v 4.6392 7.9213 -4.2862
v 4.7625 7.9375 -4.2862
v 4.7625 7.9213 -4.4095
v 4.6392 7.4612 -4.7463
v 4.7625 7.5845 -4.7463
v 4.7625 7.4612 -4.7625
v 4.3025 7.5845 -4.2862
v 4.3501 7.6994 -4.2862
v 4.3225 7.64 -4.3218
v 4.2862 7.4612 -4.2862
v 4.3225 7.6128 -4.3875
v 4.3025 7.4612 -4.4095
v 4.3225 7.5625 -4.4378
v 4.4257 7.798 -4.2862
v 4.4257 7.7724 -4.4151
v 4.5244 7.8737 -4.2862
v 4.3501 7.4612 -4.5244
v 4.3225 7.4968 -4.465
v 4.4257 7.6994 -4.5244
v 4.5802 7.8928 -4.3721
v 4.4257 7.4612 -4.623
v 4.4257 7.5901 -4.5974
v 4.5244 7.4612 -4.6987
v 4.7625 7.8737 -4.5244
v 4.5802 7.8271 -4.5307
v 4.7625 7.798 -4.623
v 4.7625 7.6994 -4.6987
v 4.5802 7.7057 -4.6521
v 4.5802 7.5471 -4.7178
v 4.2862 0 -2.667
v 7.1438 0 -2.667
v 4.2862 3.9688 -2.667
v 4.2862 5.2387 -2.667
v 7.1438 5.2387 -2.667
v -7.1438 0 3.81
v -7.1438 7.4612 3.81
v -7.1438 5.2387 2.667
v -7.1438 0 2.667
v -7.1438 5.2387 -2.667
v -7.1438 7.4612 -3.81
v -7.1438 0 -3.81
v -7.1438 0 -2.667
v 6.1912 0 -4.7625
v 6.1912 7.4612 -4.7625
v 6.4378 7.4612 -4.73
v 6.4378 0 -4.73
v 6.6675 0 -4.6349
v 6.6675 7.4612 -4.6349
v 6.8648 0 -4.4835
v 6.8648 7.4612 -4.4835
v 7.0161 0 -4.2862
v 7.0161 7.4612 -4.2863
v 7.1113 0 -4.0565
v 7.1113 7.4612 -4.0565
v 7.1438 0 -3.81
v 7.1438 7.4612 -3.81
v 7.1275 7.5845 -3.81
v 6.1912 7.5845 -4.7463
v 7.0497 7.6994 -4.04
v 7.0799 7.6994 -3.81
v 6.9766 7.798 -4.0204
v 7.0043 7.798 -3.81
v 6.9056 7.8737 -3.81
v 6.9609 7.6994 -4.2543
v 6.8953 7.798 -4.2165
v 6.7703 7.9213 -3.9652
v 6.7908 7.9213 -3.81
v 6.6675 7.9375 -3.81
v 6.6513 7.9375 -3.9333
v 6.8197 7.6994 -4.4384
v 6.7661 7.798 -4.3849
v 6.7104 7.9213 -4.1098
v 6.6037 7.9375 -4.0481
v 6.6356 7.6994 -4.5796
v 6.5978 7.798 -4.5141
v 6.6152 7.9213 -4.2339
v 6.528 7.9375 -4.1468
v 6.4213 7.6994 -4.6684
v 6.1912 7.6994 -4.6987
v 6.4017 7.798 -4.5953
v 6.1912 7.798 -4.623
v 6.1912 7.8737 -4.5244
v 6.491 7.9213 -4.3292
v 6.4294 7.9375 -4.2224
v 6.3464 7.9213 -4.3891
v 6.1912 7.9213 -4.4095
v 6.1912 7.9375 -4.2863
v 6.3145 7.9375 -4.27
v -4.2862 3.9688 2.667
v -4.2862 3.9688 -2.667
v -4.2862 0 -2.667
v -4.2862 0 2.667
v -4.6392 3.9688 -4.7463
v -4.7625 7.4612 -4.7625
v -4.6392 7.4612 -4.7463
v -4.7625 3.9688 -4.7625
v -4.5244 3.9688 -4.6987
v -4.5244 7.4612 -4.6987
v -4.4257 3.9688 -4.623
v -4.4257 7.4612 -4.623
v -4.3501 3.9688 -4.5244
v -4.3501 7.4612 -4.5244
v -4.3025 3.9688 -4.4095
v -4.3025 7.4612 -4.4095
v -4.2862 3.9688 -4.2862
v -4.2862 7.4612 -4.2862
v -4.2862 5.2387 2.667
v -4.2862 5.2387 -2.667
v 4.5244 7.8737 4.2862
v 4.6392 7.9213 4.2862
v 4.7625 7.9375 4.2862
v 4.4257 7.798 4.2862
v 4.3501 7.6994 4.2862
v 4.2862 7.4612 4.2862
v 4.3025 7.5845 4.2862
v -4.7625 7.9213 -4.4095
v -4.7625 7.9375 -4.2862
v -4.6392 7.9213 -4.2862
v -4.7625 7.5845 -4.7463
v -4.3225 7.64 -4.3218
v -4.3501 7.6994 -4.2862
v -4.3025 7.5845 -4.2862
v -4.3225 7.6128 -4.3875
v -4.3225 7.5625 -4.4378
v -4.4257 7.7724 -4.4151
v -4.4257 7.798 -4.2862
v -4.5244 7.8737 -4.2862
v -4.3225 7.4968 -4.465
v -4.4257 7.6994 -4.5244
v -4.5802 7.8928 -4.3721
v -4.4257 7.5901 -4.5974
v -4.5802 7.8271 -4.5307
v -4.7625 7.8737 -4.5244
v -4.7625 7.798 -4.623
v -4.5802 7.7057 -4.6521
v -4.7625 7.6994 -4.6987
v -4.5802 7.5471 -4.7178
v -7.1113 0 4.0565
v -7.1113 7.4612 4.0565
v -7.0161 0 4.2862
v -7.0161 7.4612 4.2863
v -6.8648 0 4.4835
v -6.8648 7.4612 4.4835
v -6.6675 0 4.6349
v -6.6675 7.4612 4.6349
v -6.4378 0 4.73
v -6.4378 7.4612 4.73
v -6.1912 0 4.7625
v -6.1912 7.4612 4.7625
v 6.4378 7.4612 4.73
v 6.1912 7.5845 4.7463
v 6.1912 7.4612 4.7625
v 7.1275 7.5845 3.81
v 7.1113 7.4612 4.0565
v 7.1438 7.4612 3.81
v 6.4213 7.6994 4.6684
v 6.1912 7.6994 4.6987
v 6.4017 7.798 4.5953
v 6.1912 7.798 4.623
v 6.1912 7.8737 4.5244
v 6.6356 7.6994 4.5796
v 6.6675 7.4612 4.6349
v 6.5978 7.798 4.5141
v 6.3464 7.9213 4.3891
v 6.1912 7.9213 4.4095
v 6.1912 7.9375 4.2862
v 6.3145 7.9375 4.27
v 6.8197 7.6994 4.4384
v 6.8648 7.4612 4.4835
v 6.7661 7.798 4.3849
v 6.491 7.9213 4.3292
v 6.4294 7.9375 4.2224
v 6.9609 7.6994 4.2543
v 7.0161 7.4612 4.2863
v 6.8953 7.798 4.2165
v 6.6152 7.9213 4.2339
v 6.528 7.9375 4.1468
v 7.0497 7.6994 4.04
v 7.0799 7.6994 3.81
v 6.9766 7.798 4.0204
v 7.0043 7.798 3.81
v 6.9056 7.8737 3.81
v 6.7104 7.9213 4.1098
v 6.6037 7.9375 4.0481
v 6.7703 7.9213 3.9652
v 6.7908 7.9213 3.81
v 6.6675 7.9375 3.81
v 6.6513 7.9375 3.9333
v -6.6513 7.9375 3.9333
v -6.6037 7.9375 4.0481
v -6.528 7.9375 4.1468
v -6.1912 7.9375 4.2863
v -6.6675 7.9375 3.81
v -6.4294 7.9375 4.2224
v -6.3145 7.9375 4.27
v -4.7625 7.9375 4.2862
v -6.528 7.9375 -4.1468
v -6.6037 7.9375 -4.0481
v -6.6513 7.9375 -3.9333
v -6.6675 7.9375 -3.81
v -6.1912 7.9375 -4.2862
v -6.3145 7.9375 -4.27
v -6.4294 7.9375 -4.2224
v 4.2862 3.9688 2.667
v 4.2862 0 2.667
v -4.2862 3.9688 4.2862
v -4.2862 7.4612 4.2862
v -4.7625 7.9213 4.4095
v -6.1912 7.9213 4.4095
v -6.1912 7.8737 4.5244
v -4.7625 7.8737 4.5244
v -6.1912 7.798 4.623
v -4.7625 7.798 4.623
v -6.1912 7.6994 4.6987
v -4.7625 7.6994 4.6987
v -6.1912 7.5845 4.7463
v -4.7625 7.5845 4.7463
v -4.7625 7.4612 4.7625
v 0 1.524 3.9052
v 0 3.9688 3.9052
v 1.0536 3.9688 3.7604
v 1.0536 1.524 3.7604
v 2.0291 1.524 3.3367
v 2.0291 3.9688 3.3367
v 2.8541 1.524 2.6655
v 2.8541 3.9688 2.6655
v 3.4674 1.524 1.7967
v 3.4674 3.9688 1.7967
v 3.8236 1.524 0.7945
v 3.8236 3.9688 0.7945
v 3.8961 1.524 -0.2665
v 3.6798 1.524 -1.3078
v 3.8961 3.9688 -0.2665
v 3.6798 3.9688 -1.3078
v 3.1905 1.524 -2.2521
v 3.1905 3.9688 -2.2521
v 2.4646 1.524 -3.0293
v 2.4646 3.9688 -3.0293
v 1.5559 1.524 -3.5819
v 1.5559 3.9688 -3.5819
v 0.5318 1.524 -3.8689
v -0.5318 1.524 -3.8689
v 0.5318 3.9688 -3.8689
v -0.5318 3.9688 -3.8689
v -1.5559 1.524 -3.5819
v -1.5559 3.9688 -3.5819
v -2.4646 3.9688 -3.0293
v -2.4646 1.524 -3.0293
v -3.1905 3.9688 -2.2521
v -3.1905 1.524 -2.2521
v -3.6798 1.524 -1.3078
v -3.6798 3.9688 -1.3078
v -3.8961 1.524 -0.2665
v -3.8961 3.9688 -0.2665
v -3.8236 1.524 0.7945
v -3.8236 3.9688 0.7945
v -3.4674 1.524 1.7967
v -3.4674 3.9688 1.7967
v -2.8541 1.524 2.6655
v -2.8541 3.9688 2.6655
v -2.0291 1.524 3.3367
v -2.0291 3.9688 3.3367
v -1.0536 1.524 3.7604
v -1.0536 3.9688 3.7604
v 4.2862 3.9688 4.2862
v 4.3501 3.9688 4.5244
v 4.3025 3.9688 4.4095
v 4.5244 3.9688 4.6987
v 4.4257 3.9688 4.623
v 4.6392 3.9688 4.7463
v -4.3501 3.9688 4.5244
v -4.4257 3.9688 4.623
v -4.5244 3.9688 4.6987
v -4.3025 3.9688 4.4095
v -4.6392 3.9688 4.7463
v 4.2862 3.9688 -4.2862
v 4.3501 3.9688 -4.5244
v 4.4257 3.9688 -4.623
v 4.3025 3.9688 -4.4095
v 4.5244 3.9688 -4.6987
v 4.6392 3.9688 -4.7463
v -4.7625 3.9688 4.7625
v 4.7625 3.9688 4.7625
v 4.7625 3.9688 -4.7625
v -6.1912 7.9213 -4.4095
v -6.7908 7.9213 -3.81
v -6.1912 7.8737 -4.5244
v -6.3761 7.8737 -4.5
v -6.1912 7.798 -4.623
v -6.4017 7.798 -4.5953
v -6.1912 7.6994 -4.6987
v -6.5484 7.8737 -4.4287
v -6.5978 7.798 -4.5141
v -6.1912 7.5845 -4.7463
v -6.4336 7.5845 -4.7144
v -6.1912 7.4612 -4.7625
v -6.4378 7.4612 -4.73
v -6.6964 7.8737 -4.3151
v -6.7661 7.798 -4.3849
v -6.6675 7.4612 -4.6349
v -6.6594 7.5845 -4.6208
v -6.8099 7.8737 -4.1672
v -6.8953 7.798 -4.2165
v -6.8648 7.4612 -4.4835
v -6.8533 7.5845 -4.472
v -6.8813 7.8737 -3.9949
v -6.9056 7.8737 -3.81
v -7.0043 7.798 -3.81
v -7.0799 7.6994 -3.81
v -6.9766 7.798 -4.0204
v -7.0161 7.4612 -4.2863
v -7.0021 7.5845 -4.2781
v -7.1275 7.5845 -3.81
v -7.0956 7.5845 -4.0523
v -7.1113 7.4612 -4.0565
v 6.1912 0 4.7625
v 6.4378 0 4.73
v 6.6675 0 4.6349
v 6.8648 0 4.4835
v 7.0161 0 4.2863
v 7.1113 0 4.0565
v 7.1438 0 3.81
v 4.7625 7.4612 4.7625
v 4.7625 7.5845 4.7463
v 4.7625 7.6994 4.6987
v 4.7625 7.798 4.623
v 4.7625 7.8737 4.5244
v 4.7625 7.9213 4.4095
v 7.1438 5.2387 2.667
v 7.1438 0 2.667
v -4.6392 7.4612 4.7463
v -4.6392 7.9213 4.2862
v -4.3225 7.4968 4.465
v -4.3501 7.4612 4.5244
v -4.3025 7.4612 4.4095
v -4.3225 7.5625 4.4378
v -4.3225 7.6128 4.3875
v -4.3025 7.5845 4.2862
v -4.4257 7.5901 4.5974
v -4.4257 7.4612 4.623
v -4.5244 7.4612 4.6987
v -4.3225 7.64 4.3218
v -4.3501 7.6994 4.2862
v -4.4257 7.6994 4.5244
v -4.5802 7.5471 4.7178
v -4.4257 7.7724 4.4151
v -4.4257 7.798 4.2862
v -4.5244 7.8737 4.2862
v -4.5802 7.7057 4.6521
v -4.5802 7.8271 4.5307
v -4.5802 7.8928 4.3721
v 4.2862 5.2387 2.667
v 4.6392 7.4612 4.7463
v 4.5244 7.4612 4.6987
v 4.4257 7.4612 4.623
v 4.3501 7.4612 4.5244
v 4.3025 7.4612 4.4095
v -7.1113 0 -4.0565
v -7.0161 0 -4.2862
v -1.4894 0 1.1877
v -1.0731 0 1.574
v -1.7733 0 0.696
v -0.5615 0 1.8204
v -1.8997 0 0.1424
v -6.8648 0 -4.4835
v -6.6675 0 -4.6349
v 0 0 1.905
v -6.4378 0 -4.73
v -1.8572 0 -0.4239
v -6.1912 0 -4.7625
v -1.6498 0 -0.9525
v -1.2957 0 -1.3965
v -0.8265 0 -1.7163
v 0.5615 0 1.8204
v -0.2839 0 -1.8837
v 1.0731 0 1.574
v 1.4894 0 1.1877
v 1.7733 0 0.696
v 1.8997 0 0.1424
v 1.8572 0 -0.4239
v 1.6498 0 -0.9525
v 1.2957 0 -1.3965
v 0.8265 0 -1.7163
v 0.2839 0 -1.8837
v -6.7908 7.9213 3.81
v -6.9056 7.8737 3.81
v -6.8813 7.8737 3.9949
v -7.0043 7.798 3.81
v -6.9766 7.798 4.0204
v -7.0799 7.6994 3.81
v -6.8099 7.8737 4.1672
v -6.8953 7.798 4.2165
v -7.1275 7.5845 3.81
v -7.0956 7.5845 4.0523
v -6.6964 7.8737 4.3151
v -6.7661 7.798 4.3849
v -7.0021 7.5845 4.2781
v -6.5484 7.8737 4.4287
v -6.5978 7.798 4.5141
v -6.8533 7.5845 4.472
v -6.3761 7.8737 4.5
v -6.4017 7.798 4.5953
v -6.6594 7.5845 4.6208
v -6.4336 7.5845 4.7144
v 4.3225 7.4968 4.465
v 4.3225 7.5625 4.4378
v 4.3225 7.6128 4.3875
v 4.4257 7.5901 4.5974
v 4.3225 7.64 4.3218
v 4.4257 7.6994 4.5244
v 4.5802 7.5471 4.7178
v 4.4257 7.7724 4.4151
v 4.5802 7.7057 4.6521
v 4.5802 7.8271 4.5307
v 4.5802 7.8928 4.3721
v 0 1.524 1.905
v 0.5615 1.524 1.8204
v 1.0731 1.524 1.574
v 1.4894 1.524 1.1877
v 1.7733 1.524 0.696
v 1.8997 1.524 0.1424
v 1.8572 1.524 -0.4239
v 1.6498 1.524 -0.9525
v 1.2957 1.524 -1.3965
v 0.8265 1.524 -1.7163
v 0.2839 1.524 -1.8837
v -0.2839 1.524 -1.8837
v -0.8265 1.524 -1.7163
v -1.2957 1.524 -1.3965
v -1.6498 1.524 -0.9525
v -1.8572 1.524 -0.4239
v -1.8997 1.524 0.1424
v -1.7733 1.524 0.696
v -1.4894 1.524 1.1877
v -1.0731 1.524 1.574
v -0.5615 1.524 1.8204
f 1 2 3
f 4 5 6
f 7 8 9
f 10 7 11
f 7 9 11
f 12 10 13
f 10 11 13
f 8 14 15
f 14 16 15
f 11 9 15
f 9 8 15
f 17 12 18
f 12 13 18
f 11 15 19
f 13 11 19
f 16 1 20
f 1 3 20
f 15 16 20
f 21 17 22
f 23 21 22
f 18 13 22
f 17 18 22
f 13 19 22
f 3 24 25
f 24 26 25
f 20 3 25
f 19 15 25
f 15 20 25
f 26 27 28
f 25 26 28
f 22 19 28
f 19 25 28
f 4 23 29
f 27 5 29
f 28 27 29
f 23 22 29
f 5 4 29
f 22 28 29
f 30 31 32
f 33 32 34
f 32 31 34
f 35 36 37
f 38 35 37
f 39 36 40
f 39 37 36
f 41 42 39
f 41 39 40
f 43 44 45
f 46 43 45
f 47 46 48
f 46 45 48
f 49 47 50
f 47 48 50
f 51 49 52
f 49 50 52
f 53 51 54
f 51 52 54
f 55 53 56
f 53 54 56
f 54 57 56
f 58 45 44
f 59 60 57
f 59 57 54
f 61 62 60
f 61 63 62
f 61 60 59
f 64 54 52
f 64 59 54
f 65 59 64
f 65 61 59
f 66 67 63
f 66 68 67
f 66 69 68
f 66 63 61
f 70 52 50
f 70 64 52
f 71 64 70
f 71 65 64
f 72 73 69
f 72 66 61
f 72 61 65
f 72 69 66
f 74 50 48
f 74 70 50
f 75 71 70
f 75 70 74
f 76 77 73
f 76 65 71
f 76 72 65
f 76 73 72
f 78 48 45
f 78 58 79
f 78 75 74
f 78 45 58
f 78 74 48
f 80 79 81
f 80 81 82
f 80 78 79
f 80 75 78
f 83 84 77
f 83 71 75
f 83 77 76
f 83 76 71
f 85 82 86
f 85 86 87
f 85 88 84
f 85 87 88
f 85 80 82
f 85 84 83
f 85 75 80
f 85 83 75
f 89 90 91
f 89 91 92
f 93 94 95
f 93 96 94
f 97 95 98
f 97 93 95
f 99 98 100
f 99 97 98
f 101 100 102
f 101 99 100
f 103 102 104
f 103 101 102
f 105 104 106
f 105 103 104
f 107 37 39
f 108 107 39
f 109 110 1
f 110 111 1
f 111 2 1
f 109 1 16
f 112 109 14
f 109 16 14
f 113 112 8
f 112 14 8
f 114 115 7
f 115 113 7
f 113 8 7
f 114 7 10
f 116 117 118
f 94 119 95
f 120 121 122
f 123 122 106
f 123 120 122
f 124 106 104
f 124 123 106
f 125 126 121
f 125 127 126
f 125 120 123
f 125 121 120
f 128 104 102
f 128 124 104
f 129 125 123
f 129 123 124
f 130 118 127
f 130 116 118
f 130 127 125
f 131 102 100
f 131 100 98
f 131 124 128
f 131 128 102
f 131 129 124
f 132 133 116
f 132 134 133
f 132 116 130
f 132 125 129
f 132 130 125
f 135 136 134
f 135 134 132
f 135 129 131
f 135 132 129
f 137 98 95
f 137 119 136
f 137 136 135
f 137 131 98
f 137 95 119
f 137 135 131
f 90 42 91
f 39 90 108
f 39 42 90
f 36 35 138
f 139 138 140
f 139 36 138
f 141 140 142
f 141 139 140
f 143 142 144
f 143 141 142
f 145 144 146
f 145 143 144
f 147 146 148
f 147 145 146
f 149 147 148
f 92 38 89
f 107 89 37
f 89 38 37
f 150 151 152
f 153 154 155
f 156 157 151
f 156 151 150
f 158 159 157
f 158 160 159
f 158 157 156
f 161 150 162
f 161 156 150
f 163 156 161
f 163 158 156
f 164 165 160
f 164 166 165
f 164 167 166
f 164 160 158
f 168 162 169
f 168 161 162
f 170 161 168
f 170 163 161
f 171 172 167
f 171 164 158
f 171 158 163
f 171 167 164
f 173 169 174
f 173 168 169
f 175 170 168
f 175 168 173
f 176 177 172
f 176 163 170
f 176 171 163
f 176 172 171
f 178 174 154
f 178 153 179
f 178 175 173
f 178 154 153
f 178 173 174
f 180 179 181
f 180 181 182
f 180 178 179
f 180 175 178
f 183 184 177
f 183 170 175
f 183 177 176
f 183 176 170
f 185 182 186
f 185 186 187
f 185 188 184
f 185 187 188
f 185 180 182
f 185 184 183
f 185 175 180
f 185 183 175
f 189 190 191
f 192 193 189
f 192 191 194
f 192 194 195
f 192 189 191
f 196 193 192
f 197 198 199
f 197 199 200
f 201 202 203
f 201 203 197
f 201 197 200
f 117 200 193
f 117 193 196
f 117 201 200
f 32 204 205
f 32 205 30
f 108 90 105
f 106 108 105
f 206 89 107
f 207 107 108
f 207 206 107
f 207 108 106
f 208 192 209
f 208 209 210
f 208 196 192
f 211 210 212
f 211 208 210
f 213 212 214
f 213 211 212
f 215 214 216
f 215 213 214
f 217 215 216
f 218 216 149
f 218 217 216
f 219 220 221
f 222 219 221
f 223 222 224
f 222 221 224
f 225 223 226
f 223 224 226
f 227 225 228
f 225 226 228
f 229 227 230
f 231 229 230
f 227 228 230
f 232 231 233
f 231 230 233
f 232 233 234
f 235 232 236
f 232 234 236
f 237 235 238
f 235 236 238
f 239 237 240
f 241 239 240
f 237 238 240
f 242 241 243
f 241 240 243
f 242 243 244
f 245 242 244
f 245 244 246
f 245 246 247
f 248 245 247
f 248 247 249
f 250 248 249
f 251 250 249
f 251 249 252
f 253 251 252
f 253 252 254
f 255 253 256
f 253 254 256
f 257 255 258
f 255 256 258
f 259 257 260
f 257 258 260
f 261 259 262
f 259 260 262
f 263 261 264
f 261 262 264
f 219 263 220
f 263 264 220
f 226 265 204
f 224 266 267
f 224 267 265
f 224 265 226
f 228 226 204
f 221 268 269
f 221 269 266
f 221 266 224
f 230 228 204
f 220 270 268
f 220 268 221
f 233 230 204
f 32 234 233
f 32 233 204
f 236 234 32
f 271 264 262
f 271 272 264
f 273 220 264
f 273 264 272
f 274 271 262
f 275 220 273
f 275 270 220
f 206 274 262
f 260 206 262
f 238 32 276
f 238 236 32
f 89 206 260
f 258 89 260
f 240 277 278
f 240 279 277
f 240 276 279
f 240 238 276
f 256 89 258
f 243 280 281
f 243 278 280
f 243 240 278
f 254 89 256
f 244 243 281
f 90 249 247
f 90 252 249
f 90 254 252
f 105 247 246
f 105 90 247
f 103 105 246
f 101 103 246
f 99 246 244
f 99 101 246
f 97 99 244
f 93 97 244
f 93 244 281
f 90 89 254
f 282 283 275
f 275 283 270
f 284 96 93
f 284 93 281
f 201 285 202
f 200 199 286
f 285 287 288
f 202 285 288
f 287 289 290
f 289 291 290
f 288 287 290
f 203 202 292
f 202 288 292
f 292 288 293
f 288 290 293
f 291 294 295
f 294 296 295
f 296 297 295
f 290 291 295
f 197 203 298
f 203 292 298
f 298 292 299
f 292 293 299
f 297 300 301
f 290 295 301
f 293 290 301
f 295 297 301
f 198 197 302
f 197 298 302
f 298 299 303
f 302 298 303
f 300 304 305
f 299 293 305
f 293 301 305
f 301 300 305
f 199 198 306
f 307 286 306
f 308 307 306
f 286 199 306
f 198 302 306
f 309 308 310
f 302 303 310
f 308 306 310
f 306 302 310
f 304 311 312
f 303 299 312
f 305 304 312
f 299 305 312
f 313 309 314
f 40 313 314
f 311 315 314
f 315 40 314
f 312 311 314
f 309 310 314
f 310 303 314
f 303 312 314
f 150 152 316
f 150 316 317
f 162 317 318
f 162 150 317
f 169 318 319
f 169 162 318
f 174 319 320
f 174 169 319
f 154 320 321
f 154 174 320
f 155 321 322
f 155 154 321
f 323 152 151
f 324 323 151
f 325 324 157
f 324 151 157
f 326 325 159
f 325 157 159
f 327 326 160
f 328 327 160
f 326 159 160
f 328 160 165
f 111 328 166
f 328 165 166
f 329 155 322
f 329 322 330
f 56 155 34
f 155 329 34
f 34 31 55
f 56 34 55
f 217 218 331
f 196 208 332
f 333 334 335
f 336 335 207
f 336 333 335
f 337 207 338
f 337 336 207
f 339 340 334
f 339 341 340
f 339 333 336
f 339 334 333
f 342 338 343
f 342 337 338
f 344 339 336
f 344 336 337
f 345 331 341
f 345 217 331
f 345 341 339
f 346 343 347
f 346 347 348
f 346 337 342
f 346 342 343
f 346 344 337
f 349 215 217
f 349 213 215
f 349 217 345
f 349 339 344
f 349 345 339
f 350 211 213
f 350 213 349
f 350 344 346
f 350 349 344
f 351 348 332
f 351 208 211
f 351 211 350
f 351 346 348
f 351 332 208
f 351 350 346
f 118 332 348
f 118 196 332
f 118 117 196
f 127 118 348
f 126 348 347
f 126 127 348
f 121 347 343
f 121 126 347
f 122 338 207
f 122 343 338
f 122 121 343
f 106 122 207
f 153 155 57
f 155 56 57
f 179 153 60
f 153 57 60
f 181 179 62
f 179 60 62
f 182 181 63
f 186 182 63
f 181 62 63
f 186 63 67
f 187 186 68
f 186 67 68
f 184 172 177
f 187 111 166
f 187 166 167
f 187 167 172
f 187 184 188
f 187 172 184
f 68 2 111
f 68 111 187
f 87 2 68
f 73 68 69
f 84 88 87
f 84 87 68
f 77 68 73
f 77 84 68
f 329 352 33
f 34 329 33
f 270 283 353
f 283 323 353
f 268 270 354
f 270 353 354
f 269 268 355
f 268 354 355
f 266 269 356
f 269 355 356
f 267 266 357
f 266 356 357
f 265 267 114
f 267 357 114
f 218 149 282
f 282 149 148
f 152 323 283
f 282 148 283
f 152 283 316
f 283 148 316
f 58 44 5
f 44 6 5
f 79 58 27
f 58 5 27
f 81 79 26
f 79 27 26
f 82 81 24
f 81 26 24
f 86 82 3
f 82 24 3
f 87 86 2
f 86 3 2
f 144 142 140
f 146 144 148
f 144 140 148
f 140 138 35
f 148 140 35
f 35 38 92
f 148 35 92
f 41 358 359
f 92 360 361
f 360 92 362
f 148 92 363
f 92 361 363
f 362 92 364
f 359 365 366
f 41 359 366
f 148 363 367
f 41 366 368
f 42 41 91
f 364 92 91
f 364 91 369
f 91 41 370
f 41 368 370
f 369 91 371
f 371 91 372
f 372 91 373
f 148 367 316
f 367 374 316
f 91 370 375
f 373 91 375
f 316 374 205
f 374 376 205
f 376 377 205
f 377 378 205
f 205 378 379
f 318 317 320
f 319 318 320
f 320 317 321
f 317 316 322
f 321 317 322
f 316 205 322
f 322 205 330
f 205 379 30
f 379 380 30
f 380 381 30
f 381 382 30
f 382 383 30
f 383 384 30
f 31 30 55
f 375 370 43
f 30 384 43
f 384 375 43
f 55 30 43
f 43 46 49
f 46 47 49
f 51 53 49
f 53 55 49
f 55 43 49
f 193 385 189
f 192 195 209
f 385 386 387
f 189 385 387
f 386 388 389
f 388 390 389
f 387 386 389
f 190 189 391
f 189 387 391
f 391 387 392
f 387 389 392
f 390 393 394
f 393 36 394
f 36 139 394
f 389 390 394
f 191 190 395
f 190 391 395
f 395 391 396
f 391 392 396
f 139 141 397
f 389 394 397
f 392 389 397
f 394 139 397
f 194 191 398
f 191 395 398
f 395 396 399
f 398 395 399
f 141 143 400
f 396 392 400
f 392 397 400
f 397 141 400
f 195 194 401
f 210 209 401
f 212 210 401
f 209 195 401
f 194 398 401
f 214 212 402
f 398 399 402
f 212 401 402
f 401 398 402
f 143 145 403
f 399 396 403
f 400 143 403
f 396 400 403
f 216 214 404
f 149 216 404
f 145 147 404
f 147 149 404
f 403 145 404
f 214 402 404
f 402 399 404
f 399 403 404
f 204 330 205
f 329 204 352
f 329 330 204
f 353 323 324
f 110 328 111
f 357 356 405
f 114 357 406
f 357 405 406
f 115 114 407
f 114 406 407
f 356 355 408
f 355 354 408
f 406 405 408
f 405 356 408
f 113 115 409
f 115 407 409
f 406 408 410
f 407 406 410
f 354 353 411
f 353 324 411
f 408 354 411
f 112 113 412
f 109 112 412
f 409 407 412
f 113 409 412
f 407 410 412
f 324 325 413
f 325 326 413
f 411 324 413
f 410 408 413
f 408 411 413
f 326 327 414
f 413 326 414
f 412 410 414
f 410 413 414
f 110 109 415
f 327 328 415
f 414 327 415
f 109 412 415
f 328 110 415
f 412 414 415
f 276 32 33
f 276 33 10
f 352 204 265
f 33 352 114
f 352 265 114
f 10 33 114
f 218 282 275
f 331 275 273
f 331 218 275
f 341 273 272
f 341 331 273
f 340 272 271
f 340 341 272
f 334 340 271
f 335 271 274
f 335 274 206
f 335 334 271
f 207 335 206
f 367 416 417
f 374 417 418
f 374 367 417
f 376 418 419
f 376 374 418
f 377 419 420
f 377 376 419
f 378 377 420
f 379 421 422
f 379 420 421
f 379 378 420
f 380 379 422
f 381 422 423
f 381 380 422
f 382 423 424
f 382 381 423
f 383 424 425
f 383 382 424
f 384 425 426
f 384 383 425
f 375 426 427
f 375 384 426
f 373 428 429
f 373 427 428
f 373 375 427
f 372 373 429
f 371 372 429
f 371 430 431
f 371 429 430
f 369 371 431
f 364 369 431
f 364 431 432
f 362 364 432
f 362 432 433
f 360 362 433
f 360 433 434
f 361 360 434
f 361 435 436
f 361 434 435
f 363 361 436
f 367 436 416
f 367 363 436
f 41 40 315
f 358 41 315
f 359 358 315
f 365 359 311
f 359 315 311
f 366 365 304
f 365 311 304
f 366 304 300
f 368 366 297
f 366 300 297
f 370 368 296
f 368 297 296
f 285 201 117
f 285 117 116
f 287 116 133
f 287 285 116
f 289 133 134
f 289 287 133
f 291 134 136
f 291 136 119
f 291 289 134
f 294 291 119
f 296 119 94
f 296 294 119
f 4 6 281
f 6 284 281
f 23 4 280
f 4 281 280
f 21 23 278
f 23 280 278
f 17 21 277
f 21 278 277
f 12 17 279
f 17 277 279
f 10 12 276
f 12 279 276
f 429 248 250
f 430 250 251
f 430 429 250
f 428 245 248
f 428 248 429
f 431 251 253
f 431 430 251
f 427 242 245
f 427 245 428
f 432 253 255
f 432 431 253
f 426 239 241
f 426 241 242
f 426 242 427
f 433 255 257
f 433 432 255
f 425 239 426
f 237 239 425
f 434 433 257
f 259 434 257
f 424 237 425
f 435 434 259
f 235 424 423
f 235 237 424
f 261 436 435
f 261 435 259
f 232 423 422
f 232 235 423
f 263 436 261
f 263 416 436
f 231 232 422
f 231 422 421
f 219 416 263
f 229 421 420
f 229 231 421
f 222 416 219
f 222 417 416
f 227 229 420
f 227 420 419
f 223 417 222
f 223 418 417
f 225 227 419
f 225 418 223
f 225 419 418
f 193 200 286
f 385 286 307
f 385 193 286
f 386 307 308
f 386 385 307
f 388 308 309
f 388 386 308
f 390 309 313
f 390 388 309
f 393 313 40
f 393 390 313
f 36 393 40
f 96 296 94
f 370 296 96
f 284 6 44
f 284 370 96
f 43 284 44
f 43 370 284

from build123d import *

# Parameters (mm, degrees)
SKETCH1_W               = 14.2875
SKETCH1_H               = 9.525
SKETCH1_R               = 1.905
BOSS_EXTRUDE1_DEPTH     = 7.9375
SKETCH2_W               = 8.5725
SKETCH2_H               = 3.96875
CUT_EXTRUDE1_DEPTH      = 15.309531624
CUT_EXTRUDE2_DEPTH      = 12.692667641
CUT_EXTRUDE2_DEPTH_BACK = 12.692667641
SKETCH3_W               = 5.334
SKETCH3_H               = 1.27
SKETCH4_W               = 5.334
SKETCH4_H               = 3.96875
CUT_EXTRUDE3_DEPTH      = 2.8575
SKETCH5_W               = 5.334
SKETCH5_H               = 3.96875
CUT_EXTRUDE4_DEPTH      = 2.8575
SKETCH6_R               = 3.90525
CUT_EXTRUDE5_DEPTH      = 2.44475
FILLET2_R               = 0.9525
FILLET3_R               = 0.47625


with BuildPart() as part:
    # Sketch1 → Boss-Extrude1 (new body)
    with BuildSketch(Plane(origin=(0, 0, 0), x_dir=(1, 0, 0), z_dir=(0, 1, 0))):
        Rectangle(SKETCH1_W, SKETCH1_H)
        with Locations(Location((0, 0, 0), (0, 0, 270))):
            Circle(SKETCH1_R, mode=Mode.SUBTRACT)
    extrude(amount=BOSS_EXTRUDE1_DEPTH)

    # Sketch2 → Cut-Extrude1 (cut, through all)
    with BuildSketch(Plane.XY.offset(4.7625)):
        with Locations((0, 5.953125)):
            Rectangle(SKETCH2_W, SKETCH2_H)
    extrude(amount=-CUT_EXTRUDE1_DEPTH, mode=Mode.SUBTRACT)

    # Sketch3 → Cut-Extrude2 (cut, two sides: drawn at the far end of the back side and taken through both)
    with BuildSketch(Plane(origin=(0, 0, 0), x_dir=(0, 0, -1), z_dir=(1, 0, 0)).offset(-CUT_EXTRUDE2_DEPTH_BACK)):
        with Locations((0, 4.60375)):
            Rectangle(SKETCH3_W, SKETCH3_H)
    extrude(amount=CUT_EXTRUDE2_DEPTH + CUT_EXTRUDE2_DEPTH_BACK, mode=Mode.SUBTRACT)

    # Sketch4 → Cut-Extrude3 (cut)
    with BuildSketch(Plane(origin=(7.14375, 0, 0), x_dir=(0, 0, -1), z_dir=(1, 0, 0))):
        with Locations((0, 1.984375)):
            Rectangle(SKETCH4_W, SKETCH4_H)
    extrude(amount=-CUT_EXTRUDE3_DEPTH, mode=Mode.SUBTRACT)

    # Sketch5 → Cut-Extrude4 (cut)
    with BuildSketch(Plane.ZY.offset(7.14375)):
        with Locations((0, 1.984375)):
            Rectangle(SKETCH5_W, SKETCH5_H)
    extrude(amount=-CUT_EXTRUDE4_DEPTH, mode=Mode.SUBTRACT)

    # Sketch6 → Cut-Extrude5 (cut)
    with BuildSketch(Plane(origin=(0, 3.96875, 0), x_dir=(1, 0, 0), z_dir=(0, 1, 0))):
        with Locations(Location((0, 0, 0), (0, 0, 270))):
            Circle(SKETCH6_R)
    extrude(amount=-CUT_EXTRUDE5_DEPTH, mode=Mode.SUBTRACT)

    # Fillet2
    fillet2_edges = [part.edges().sort_by_distance(p)[0] for p in [
        (-7.14375, 3.96875, 4.7625),
        (7.14375, 3.96875, 4.7625),
        (-7.14375, 3.96875, -4.7625),
        (7.14375, 3.96875, -4.7625),
    ]]
    fillet(fillet2_edges, radius=FILLET2_R)

    # Fillet3
    fillet3_edges = [part.edges().sort_by_distance(p)[0] for p in [
        (5.23875, 7.9375, 4.7625),
        (-5.23875, 7.9375, 4.7625),
        (4.28625, 5.953125, 4.7625),
        (-4.28625, 5.953125, 4.7625),
        (6.864769209, 7.9375, 4.483519209),
        (-6.864769209, 7.9375, 4.483519209),
        (7.14375, 7.9375, 0),
        (6.864769209, 7.9375, -4.483519209),
        (5.23875, 7.9375, -4.7625),
        (4.28625, 7.9375, 0),
        (-5.23875, 7.9375, -4.7625),
        (-6.864769209, 7.9375, -4.483519209),
        (-4.28625, 7.9375, 0),
        (-7.14375, 7.9375, 0),
        (4.28625, 5.953125, -4.7625),
        (-4.28625, 5.953125, -4.7625),
    ]]
    fillet(fillet3_edges, radius=FILLET3_R)


solid = part.part
